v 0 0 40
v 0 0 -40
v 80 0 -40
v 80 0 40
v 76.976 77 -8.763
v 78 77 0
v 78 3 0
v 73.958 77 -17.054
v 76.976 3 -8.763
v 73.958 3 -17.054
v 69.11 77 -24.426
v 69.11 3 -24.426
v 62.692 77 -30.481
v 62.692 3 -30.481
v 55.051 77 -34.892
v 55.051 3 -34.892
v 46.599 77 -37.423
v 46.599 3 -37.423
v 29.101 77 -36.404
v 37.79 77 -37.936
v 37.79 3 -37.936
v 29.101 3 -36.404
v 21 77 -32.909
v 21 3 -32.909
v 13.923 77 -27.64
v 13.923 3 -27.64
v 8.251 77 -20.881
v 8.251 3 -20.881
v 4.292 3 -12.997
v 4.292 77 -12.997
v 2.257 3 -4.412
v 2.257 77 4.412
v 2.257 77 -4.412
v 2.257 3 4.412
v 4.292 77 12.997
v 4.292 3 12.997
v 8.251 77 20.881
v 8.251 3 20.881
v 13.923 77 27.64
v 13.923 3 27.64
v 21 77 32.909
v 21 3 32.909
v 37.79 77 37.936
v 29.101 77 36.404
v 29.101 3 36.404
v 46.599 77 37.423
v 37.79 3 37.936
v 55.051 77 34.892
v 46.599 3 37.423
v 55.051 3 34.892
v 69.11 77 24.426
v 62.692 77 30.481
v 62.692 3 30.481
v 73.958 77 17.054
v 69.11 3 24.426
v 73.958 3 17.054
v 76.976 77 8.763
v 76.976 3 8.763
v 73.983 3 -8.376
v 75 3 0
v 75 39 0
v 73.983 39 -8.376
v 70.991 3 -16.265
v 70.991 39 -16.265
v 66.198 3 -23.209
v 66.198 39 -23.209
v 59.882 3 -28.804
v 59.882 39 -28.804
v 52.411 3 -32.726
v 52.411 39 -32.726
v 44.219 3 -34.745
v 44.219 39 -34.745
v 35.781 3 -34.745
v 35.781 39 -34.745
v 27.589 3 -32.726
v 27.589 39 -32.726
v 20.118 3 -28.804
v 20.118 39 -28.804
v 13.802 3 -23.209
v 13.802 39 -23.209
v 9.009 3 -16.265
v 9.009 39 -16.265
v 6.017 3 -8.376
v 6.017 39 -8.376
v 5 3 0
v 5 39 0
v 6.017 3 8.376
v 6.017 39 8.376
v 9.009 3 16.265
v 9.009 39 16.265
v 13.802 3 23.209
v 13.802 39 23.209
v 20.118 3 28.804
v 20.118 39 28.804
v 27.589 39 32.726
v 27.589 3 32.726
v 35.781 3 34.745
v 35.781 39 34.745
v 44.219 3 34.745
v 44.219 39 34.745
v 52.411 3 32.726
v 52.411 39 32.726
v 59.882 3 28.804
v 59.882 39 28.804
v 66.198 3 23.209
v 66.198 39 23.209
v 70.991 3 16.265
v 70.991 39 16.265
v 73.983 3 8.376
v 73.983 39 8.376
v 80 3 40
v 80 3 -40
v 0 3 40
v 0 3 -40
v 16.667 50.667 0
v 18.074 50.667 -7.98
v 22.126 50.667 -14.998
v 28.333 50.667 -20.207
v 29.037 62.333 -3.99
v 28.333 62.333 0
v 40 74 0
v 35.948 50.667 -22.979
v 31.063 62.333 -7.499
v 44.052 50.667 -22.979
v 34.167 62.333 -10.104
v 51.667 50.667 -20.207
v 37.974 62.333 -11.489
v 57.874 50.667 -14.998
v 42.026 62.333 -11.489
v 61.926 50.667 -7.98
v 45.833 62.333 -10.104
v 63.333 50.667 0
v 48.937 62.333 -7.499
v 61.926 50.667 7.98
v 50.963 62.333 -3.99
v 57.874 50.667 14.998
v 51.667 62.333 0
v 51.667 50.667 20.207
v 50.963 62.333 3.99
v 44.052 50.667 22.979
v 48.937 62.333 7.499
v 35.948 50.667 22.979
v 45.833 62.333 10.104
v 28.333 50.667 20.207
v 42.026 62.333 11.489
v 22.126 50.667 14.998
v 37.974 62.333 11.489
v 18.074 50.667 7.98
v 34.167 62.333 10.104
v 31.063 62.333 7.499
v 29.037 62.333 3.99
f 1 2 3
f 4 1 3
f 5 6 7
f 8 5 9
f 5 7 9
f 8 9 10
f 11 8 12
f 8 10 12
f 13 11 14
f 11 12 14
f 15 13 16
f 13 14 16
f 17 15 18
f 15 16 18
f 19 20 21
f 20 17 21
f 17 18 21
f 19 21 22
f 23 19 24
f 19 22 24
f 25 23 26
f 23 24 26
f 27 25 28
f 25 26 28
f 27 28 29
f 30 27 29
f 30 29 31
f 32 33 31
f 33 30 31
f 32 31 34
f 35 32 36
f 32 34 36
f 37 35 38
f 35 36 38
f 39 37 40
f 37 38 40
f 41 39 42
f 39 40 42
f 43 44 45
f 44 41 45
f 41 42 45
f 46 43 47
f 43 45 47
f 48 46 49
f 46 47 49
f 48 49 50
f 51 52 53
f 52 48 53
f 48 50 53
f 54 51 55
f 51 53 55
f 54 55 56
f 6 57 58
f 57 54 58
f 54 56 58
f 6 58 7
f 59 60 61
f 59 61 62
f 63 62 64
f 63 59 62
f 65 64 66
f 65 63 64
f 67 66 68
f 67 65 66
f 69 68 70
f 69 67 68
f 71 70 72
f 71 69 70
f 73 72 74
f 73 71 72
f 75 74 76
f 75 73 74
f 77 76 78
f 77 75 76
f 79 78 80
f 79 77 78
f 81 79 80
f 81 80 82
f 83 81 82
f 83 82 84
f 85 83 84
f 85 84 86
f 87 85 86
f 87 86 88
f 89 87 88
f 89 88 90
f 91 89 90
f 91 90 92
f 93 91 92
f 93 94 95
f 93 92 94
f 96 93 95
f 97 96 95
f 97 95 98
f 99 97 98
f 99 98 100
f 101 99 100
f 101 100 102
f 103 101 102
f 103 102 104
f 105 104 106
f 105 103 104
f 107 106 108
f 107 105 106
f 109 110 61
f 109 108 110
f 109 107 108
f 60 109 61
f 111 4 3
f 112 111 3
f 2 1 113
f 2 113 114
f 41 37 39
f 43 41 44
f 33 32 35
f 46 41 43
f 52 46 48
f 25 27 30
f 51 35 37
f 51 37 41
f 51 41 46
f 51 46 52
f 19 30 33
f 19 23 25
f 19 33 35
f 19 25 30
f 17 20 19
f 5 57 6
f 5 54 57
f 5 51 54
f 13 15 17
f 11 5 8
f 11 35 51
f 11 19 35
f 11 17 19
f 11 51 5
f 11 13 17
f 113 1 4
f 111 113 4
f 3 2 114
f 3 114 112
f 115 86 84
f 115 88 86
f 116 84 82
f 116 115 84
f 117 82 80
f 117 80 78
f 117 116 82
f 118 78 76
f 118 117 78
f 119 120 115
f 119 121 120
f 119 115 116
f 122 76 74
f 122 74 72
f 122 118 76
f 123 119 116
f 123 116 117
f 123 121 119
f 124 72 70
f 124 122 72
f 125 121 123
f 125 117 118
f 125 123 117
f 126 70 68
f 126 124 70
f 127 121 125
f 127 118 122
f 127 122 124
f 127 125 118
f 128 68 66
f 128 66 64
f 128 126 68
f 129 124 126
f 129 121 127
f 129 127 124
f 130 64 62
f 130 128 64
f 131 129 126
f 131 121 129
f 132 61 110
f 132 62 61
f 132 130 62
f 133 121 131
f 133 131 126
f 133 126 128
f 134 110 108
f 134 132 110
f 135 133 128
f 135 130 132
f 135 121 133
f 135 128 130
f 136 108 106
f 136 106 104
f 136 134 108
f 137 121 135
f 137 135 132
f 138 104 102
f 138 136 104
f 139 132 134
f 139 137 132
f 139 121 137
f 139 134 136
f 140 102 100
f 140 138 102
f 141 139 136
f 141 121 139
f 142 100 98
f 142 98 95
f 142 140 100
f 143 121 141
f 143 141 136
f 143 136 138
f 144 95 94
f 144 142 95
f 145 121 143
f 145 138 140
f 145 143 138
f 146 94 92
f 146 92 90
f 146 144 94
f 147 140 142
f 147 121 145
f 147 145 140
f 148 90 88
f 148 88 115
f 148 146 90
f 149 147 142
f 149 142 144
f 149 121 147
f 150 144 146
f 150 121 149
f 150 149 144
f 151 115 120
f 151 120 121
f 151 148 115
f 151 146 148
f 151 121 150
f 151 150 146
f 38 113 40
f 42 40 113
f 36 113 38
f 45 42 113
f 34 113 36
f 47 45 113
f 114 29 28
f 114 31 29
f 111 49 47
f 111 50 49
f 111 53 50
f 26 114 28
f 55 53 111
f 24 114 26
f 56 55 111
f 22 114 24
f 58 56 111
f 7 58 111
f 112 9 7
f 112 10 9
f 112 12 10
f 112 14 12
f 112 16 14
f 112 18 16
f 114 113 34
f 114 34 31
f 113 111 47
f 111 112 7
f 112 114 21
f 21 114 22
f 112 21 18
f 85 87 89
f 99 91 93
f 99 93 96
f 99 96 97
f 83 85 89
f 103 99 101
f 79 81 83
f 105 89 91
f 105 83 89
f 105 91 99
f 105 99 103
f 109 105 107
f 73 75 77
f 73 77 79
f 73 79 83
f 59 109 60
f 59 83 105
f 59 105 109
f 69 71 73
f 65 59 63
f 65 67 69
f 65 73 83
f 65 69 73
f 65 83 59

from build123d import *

# Parameters (mm, degrees)
SKETCH1_W           = 80
SKETCH1_H           = 80
BOSS_EXTRUDE1_DEPTH = 3
SKETCH3_R           = 38
SKETCH3_R_2         = 35
EXTRUDE_THIN1_DEPTH = 74


with BuildPart() as part:
    # Sketch1 → Boss-Extrude1 (new body)
    with BuildSketch(Plane(origin=(0, 0, 0), x_dir=(1, 0, 0), z_dir=(0, 1, 0))):
        with Locations((40, 0)):
            Rectangle(SKETCH1_W, SKETCH1_H)
    extrude(amount=BOSS_EXTRUDE1_DEPTH)

    # Sketch3 → Extrude-Thin1 (add)
    with BuildSketch(Plane(origin=(0, 3, 0), x_dir=(1, 0, 0), z_dir=(0, 1, 0))):
        with Locations((40, 0)):
            Circle(SKETCH3_R)
        with Locations((40, 0)):
            Circle(SKETCH3_R_2, mode=Mode.SUBTRACT)
    extrude(amount=EXTRUDE_THIN1_DEPTH)

    # Sketch7 → Revolve5 (revolve)
    with BuildSketch(Plane.XY):
        Polygon((40, 77), (2, 77), (2, 36), (40, 74), align=None)
    revolve(axis=Axis((40, 77, 0), (0, -1, 0)))


solid = part.part
